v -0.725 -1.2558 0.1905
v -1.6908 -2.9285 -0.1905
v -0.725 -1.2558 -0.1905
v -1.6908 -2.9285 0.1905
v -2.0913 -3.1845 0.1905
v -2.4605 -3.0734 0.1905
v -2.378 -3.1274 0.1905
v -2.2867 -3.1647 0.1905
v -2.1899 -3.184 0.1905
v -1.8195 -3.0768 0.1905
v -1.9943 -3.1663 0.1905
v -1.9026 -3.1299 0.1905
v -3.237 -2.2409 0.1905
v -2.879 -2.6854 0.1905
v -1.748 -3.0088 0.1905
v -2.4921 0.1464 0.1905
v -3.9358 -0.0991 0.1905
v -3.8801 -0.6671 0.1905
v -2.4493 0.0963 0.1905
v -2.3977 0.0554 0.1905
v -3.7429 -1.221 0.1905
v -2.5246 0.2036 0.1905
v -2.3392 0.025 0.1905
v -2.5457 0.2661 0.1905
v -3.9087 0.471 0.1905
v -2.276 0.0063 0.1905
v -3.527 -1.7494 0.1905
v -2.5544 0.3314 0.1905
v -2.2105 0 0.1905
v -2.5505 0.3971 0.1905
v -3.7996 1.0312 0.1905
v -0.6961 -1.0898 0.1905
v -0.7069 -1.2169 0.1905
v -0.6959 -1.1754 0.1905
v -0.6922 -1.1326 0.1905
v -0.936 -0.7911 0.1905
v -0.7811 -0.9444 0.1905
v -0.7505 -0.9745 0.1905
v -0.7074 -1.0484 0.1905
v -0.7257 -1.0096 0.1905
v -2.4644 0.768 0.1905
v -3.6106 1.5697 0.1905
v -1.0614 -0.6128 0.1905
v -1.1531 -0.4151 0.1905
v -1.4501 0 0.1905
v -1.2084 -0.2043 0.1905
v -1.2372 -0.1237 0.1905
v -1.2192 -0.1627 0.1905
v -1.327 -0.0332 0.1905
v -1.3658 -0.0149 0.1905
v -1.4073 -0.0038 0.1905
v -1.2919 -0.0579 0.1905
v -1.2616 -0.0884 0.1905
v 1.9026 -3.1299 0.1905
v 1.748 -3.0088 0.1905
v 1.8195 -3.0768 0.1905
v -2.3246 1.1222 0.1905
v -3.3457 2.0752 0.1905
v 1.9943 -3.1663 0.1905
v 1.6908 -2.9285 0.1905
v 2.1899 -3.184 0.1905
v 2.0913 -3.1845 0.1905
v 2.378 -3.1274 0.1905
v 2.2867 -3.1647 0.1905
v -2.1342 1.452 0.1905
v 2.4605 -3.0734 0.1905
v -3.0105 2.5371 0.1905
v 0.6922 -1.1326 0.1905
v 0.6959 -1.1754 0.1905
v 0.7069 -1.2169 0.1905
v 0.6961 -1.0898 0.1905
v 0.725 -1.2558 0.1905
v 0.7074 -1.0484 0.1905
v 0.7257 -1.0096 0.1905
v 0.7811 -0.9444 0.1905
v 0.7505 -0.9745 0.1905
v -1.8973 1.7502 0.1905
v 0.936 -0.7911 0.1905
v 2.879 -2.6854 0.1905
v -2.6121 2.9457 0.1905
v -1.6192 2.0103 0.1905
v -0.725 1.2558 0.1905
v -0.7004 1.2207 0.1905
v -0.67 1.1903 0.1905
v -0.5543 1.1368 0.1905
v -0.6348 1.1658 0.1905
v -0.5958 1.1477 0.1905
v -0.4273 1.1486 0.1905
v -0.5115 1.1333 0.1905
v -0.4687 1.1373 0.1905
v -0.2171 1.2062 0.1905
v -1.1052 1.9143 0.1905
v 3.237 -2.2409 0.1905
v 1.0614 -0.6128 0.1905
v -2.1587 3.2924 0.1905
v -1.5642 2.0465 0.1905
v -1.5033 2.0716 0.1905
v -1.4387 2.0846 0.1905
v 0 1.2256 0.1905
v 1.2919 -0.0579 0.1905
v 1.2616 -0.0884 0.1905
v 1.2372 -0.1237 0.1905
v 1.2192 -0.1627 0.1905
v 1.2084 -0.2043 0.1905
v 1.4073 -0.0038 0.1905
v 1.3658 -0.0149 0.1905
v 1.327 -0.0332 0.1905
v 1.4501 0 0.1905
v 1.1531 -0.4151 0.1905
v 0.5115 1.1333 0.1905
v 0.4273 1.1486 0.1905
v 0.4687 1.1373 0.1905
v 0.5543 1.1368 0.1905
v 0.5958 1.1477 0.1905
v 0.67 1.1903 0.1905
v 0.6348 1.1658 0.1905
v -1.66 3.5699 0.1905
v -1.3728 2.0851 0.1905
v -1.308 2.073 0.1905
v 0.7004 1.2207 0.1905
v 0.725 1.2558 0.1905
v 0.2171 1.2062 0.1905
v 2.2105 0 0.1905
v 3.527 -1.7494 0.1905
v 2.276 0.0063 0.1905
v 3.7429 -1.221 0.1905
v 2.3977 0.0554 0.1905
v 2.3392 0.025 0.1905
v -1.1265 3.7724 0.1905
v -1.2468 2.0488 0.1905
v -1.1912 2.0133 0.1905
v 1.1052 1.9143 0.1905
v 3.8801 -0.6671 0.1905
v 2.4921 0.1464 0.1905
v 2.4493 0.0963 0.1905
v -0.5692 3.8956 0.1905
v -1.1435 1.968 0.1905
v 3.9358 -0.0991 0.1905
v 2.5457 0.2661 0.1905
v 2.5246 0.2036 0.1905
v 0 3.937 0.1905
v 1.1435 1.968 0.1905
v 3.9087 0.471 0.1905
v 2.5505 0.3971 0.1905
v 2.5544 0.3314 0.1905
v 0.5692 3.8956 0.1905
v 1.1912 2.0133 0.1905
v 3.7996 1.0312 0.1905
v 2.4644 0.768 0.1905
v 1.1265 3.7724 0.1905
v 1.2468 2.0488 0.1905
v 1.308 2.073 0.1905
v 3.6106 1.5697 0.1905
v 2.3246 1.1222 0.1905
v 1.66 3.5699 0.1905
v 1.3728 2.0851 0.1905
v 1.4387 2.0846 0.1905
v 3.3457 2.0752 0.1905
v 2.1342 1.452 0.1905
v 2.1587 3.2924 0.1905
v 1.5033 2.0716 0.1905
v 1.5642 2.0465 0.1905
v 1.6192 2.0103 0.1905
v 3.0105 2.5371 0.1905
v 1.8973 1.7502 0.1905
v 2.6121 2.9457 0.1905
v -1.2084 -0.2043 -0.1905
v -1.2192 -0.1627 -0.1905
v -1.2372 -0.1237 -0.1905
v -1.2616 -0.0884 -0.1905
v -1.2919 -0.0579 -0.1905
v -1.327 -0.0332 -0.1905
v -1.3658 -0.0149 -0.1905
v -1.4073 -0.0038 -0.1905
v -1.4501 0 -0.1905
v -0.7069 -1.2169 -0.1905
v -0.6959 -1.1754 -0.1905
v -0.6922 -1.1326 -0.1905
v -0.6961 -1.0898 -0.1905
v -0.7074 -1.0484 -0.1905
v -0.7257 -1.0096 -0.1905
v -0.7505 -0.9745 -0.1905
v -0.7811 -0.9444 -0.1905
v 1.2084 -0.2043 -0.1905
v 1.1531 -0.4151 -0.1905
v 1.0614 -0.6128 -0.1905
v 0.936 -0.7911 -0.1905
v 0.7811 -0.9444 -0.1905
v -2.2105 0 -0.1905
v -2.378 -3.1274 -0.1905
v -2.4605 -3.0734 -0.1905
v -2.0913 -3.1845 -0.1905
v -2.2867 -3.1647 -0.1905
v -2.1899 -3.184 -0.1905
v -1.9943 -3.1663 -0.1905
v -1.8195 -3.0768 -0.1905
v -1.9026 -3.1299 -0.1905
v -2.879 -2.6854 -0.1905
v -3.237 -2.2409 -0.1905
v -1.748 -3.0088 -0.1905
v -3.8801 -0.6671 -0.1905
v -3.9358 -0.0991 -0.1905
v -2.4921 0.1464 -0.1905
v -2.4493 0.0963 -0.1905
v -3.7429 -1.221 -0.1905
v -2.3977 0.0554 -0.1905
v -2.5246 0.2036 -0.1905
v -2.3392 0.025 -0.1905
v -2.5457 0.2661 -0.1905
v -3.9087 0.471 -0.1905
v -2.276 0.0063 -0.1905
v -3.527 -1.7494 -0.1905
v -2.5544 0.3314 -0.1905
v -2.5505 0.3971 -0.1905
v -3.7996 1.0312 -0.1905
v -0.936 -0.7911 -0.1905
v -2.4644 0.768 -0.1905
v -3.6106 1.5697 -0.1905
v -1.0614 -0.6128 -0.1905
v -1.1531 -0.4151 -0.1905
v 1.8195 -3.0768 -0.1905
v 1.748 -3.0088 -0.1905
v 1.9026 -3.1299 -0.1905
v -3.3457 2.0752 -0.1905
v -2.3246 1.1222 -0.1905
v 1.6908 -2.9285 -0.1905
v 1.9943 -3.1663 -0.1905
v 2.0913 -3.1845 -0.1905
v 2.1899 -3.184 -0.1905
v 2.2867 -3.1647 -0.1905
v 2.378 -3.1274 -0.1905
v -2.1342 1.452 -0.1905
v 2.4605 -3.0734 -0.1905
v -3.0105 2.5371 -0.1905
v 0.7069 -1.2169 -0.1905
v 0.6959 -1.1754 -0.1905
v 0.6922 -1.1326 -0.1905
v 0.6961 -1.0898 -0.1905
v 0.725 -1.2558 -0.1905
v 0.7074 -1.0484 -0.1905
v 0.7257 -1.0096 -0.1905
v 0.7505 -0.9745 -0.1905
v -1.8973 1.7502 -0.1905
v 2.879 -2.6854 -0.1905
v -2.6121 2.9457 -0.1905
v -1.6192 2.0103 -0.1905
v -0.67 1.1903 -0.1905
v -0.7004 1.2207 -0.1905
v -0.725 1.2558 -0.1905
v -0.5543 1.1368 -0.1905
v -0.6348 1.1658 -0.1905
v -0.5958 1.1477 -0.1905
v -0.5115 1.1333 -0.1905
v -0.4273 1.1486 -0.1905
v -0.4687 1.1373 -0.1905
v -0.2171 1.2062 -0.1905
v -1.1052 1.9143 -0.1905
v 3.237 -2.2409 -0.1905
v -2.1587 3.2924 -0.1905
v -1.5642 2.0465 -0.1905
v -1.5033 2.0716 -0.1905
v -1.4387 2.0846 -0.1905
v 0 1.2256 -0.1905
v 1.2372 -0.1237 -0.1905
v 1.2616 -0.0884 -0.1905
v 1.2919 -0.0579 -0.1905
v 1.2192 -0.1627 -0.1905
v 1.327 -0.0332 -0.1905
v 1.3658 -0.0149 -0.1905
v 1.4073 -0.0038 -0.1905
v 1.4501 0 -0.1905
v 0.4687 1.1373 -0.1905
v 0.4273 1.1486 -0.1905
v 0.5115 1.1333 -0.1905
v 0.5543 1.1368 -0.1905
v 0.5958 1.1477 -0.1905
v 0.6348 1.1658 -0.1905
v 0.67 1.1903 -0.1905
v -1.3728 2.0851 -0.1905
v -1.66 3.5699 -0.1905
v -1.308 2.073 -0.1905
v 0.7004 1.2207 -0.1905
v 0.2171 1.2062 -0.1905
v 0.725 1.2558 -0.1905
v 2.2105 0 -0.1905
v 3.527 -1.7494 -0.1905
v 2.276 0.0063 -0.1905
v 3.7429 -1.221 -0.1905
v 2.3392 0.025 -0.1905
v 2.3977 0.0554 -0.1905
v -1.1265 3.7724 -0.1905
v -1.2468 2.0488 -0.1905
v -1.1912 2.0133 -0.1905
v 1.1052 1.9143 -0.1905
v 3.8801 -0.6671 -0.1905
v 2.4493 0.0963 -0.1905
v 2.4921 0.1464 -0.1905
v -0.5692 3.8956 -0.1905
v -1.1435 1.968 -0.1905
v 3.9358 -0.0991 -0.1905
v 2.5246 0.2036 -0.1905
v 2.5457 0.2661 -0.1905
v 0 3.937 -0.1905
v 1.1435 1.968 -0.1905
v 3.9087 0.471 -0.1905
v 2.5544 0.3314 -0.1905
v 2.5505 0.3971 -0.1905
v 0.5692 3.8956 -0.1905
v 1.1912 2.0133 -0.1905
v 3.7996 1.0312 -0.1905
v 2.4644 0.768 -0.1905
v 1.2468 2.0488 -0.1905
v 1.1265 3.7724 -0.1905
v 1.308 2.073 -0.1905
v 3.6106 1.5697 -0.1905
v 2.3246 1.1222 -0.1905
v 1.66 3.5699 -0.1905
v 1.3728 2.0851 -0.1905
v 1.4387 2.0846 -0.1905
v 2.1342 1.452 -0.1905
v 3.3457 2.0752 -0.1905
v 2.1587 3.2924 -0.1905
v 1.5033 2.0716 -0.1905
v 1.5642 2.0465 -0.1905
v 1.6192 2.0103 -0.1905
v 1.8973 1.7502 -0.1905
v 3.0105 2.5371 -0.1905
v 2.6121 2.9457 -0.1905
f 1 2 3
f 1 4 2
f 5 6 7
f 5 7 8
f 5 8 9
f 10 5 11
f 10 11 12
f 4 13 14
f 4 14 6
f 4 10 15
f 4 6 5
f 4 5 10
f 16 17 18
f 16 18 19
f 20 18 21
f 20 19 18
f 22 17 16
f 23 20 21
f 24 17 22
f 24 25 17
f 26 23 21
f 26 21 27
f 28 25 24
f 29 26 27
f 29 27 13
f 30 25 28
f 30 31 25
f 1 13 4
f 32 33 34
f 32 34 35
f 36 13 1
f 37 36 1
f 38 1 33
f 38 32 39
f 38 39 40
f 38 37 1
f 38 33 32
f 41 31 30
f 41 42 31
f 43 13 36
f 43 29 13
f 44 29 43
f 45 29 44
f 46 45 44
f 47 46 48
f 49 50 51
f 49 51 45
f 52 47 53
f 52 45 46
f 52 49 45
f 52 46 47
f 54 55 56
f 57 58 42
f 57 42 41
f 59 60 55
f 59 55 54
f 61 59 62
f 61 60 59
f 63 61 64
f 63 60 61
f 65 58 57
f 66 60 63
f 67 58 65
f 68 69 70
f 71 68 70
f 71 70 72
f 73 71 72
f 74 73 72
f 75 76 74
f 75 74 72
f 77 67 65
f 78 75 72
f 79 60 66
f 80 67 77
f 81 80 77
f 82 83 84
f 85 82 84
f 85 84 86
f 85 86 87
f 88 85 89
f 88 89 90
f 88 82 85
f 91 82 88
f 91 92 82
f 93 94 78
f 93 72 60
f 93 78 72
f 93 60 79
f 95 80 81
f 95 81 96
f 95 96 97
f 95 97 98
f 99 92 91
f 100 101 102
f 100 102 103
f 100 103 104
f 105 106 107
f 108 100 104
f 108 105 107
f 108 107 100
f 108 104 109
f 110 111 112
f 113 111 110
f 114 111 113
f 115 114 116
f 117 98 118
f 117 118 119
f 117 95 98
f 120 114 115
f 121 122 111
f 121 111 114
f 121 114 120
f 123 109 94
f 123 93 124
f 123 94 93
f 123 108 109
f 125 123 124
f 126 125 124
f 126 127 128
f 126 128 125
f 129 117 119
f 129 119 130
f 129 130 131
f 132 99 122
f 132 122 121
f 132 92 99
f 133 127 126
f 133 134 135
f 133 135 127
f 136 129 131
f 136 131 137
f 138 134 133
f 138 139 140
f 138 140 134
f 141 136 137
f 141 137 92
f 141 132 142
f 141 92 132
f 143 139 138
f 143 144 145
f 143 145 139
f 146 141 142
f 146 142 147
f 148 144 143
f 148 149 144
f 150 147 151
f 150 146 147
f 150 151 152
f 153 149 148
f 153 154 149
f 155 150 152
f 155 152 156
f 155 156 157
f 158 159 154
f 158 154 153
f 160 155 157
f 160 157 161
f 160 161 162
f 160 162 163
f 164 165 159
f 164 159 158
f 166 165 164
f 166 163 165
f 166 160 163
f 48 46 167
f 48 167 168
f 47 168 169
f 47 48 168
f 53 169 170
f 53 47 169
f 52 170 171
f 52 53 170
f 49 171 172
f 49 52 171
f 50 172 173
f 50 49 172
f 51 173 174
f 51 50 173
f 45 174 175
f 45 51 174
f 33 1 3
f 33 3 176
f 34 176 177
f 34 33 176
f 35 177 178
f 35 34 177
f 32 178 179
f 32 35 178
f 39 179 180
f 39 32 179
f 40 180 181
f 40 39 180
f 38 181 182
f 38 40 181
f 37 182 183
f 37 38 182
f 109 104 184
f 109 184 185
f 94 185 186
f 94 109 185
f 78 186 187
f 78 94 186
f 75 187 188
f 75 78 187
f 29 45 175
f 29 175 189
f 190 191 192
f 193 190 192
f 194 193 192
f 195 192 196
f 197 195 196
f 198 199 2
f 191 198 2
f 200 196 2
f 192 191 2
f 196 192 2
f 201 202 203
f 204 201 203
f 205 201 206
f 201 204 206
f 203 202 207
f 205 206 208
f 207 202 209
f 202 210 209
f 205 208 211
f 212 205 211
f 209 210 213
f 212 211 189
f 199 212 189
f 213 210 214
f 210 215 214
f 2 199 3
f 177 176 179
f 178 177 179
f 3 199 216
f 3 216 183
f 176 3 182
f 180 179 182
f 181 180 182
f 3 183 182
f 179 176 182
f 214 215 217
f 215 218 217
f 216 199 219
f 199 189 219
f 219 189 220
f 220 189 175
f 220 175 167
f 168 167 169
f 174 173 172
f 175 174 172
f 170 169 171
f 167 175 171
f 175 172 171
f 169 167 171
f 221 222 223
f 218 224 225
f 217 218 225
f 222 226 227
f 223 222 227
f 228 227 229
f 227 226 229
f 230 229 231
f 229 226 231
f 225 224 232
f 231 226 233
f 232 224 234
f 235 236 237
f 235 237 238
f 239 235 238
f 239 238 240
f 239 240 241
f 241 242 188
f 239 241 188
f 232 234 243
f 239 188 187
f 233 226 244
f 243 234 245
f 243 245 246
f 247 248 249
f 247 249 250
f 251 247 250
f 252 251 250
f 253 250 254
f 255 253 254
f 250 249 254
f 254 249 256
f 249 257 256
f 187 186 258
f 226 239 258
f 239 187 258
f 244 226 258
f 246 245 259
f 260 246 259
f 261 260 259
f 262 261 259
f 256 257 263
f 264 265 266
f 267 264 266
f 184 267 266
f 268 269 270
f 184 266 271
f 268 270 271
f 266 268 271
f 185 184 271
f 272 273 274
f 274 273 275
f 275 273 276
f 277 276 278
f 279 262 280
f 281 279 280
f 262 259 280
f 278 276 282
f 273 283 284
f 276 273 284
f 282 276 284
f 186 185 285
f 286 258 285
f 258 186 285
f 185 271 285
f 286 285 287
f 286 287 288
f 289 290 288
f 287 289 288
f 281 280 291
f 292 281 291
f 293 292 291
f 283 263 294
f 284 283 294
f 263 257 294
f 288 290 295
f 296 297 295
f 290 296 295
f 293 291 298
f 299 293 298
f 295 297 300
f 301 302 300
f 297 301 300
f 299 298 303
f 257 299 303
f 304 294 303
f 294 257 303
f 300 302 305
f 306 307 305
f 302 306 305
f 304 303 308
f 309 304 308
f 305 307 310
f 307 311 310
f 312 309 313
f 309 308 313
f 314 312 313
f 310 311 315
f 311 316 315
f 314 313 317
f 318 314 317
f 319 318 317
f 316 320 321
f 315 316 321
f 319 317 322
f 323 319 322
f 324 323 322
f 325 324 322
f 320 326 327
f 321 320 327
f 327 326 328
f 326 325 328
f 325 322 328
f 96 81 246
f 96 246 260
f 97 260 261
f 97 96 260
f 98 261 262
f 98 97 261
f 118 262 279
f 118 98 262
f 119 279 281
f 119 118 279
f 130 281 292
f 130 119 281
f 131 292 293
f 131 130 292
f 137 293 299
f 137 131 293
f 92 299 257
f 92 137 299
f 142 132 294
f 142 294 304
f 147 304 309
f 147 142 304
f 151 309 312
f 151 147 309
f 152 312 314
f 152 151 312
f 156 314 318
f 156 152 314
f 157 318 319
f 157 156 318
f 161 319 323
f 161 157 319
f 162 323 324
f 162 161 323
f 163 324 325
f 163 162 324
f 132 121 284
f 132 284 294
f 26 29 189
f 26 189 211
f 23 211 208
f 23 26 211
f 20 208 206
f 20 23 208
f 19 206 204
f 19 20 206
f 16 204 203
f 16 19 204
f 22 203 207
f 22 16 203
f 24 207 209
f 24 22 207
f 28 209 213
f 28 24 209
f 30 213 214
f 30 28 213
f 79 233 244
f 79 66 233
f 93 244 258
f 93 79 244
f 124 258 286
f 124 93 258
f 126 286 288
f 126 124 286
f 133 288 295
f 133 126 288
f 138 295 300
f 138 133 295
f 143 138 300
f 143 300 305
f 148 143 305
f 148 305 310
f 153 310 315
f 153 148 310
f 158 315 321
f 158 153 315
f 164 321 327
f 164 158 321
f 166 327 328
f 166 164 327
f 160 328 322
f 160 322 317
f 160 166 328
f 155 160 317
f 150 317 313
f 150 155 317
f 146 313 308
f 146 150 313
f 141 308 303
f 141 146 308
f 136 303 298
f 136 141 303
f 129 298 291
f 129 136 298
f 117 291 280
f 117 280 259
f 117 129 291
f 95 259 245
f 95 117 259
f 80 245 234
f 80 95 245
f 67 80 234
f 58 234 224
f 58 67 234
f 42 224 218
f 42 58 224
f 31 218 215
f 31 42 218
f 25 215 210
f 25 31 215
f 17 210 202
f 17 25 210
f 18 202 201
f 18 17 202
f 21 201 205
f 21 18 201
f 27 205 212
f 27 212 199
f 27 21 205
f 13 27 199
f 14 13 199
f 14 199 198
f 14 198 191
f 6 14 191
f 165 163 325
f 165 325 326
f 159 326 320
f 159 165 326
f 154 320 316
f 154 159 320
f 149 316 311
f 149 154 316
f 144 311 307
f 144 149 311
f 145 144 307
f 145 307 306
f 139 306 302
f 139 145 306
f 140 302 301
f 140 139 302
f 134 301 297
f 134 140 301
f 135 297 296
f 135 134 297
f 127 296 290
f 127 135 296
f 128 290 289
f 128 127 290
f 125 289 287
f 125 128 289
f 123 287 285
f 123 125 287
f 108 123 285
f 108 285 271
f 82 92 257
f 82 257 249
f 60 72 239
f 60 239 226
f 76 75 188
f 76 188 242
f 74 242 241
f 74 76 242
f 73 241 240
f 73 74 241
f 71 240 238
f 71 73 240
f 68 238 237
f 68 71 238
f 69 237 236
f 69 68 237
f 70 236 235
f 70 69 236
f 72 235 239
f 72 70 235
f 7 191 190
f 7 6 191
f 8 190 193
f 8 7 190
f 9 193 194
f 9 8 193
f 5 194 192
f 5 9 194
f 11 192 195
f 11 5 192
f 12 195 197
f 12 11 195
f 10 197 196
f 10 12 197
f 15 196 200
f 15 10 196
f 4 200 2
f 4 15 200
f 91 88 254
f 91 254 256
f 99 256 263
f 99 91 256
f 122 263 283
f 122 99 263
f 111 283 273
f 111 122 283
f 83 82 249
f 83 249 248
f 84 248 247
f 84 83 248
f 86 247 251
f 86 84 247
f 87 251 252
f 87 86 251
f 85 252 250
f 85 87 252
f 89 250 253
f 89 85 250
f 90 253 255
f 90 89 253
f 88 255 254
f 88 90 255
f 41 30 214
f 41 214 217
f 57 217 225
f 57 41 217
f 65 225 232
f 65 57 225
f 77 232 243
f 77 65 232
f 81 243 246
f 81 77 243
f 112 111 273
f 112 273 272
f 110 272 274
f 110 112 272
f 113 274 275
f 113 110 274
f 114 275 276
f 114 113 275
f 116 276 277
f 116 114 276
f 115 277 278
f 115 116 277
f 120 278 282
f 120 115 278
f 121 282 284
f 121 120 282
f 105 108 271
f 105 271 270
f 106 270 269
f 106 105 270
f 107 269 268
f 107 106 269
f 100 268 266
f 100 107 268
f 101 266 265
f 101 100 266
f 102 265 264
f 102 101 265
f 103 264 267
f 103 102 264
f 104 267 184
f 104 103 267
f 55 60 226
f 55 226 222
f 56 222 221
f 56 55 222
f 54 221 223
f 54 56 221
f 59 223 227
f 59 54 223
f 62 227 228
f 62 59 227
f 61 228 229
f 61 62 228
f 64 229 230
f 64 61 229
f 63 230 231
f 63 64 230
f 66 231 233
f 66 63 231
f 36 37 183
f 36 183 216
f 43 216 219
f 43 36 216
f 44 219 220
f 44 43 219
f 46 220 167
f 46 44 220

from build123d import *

# Parameters (mm, degrees)
BOSS_EXTRUDE1_DEPTH      = 0.1905
BOSS_EXTRUDE1_DEPTH_BACK = 0.1905


with BuildPart() as part:
    # Sketch1 → Boss-Extrude1 (new, two sides: drawn at the far end of the back side and taken through both)
    with BuildSketch(Plane.XY.offset(-BOSS_EXTRUDE1_DEPTH_BACK)):
        with BuildLine():
            Line((-1.690782151, -2.92852059), (-0.725045158, -1.255815051))
            ThreePointArc((-0.725045158, -1.255815051), (-0.696082706, -1.089842323), (-0.781097204, -0.944383376))
            ThreePointArc((-0.781097204, -0.944383376), (-1.061357434, -0.612775), (-1.208408596, -0.204258333))
            ThreePointArc((-1.208408596, -0.204258333), (-1.291872491, -0.057904145), (-1.450090316, 0))
            Line((-1.450090316, 0), (-2.210471848, 0))
            ThreePointArc((-2.210471848, 0), (-2.471887729, 0.120306814), (-2.55054444, 0.397119231))
            ThreePointArc((-2.55054444, 0.397119231), (-2.235449712, 1.29063752), (-1.619187526, 2.010276693))
            ThreePointArc((-1.619187526, 2.010276693), (-1.340132599, 2.080564158), (-1.105235924, 1.914324775))
            Line((-1.105235924, 1.914324775), (-0.725045158, 1.255815051))
            ThreePointArc((-0.725045158, 1.255815051), (-0.595789785, 1.147746468), (-0.427311393, 1.148641709))
            ThreePointArc((-0.427311393, 1.148641709), (0, 1.22555), (0.427311393, 1.148641709))
            ThreePointArc((0.427311393, 1.148641709), (0.595789785, 1.147746468), (0.725045158, 1.255815051))
            Line((0.725045158, 1.255815051), (1.105235924, 1.914324775))
            ThreePointArc((1.105235924, 1.914324775), (1.340132631, 2.080564164), (1.619187578, 2.010276651))
            ThreePointArc((1.619187578, 2.010276651), (2.235449717, 1.290637512), (2.550544433, 0.397119278))
            ThreePointArc((2.550544433, 0.397119278), (2.471887745, 0.120306832), (2.210471848, 0))
            Line((2.210471848, 0), (1.450090316, 0))
            ThreePointArc((1.450090316, 0), (1.291872491, -0.057904145), (1.208408596, -0.204258333))
            ThreePointArc((1.208408596, -0.204258333), (1.061357434, -0.612775), (0.781097204, -0.944383376))
            ThreePointArc((0.781097204, -0.944383376), (0.696082706, -1.089842323), (0.725045158, -1.255815051))
            Line((0.725045158, -1.255815051), (1.690782151, -2.92852059))
            ThreePointArc((1.690782151, -2.92852059), (2.042375748, -3.177738803), (2.460517356, -3.073405821))
            ThreePointArc((2.460517356, -3.073405821), (0, 3.937), (-2.460517356, -3.073405821))
            ThreePointArc((-2.460517356, -3.073405821), (-2.042375748, -3.177738803), (-1.690782151, -2.92852059))
        make_face()
    extrude(amount=BOSS_EXTRUDE1_DEPTH + BOSS_EXTRUDE1_DEPTH_BACK)


solid = part.part
